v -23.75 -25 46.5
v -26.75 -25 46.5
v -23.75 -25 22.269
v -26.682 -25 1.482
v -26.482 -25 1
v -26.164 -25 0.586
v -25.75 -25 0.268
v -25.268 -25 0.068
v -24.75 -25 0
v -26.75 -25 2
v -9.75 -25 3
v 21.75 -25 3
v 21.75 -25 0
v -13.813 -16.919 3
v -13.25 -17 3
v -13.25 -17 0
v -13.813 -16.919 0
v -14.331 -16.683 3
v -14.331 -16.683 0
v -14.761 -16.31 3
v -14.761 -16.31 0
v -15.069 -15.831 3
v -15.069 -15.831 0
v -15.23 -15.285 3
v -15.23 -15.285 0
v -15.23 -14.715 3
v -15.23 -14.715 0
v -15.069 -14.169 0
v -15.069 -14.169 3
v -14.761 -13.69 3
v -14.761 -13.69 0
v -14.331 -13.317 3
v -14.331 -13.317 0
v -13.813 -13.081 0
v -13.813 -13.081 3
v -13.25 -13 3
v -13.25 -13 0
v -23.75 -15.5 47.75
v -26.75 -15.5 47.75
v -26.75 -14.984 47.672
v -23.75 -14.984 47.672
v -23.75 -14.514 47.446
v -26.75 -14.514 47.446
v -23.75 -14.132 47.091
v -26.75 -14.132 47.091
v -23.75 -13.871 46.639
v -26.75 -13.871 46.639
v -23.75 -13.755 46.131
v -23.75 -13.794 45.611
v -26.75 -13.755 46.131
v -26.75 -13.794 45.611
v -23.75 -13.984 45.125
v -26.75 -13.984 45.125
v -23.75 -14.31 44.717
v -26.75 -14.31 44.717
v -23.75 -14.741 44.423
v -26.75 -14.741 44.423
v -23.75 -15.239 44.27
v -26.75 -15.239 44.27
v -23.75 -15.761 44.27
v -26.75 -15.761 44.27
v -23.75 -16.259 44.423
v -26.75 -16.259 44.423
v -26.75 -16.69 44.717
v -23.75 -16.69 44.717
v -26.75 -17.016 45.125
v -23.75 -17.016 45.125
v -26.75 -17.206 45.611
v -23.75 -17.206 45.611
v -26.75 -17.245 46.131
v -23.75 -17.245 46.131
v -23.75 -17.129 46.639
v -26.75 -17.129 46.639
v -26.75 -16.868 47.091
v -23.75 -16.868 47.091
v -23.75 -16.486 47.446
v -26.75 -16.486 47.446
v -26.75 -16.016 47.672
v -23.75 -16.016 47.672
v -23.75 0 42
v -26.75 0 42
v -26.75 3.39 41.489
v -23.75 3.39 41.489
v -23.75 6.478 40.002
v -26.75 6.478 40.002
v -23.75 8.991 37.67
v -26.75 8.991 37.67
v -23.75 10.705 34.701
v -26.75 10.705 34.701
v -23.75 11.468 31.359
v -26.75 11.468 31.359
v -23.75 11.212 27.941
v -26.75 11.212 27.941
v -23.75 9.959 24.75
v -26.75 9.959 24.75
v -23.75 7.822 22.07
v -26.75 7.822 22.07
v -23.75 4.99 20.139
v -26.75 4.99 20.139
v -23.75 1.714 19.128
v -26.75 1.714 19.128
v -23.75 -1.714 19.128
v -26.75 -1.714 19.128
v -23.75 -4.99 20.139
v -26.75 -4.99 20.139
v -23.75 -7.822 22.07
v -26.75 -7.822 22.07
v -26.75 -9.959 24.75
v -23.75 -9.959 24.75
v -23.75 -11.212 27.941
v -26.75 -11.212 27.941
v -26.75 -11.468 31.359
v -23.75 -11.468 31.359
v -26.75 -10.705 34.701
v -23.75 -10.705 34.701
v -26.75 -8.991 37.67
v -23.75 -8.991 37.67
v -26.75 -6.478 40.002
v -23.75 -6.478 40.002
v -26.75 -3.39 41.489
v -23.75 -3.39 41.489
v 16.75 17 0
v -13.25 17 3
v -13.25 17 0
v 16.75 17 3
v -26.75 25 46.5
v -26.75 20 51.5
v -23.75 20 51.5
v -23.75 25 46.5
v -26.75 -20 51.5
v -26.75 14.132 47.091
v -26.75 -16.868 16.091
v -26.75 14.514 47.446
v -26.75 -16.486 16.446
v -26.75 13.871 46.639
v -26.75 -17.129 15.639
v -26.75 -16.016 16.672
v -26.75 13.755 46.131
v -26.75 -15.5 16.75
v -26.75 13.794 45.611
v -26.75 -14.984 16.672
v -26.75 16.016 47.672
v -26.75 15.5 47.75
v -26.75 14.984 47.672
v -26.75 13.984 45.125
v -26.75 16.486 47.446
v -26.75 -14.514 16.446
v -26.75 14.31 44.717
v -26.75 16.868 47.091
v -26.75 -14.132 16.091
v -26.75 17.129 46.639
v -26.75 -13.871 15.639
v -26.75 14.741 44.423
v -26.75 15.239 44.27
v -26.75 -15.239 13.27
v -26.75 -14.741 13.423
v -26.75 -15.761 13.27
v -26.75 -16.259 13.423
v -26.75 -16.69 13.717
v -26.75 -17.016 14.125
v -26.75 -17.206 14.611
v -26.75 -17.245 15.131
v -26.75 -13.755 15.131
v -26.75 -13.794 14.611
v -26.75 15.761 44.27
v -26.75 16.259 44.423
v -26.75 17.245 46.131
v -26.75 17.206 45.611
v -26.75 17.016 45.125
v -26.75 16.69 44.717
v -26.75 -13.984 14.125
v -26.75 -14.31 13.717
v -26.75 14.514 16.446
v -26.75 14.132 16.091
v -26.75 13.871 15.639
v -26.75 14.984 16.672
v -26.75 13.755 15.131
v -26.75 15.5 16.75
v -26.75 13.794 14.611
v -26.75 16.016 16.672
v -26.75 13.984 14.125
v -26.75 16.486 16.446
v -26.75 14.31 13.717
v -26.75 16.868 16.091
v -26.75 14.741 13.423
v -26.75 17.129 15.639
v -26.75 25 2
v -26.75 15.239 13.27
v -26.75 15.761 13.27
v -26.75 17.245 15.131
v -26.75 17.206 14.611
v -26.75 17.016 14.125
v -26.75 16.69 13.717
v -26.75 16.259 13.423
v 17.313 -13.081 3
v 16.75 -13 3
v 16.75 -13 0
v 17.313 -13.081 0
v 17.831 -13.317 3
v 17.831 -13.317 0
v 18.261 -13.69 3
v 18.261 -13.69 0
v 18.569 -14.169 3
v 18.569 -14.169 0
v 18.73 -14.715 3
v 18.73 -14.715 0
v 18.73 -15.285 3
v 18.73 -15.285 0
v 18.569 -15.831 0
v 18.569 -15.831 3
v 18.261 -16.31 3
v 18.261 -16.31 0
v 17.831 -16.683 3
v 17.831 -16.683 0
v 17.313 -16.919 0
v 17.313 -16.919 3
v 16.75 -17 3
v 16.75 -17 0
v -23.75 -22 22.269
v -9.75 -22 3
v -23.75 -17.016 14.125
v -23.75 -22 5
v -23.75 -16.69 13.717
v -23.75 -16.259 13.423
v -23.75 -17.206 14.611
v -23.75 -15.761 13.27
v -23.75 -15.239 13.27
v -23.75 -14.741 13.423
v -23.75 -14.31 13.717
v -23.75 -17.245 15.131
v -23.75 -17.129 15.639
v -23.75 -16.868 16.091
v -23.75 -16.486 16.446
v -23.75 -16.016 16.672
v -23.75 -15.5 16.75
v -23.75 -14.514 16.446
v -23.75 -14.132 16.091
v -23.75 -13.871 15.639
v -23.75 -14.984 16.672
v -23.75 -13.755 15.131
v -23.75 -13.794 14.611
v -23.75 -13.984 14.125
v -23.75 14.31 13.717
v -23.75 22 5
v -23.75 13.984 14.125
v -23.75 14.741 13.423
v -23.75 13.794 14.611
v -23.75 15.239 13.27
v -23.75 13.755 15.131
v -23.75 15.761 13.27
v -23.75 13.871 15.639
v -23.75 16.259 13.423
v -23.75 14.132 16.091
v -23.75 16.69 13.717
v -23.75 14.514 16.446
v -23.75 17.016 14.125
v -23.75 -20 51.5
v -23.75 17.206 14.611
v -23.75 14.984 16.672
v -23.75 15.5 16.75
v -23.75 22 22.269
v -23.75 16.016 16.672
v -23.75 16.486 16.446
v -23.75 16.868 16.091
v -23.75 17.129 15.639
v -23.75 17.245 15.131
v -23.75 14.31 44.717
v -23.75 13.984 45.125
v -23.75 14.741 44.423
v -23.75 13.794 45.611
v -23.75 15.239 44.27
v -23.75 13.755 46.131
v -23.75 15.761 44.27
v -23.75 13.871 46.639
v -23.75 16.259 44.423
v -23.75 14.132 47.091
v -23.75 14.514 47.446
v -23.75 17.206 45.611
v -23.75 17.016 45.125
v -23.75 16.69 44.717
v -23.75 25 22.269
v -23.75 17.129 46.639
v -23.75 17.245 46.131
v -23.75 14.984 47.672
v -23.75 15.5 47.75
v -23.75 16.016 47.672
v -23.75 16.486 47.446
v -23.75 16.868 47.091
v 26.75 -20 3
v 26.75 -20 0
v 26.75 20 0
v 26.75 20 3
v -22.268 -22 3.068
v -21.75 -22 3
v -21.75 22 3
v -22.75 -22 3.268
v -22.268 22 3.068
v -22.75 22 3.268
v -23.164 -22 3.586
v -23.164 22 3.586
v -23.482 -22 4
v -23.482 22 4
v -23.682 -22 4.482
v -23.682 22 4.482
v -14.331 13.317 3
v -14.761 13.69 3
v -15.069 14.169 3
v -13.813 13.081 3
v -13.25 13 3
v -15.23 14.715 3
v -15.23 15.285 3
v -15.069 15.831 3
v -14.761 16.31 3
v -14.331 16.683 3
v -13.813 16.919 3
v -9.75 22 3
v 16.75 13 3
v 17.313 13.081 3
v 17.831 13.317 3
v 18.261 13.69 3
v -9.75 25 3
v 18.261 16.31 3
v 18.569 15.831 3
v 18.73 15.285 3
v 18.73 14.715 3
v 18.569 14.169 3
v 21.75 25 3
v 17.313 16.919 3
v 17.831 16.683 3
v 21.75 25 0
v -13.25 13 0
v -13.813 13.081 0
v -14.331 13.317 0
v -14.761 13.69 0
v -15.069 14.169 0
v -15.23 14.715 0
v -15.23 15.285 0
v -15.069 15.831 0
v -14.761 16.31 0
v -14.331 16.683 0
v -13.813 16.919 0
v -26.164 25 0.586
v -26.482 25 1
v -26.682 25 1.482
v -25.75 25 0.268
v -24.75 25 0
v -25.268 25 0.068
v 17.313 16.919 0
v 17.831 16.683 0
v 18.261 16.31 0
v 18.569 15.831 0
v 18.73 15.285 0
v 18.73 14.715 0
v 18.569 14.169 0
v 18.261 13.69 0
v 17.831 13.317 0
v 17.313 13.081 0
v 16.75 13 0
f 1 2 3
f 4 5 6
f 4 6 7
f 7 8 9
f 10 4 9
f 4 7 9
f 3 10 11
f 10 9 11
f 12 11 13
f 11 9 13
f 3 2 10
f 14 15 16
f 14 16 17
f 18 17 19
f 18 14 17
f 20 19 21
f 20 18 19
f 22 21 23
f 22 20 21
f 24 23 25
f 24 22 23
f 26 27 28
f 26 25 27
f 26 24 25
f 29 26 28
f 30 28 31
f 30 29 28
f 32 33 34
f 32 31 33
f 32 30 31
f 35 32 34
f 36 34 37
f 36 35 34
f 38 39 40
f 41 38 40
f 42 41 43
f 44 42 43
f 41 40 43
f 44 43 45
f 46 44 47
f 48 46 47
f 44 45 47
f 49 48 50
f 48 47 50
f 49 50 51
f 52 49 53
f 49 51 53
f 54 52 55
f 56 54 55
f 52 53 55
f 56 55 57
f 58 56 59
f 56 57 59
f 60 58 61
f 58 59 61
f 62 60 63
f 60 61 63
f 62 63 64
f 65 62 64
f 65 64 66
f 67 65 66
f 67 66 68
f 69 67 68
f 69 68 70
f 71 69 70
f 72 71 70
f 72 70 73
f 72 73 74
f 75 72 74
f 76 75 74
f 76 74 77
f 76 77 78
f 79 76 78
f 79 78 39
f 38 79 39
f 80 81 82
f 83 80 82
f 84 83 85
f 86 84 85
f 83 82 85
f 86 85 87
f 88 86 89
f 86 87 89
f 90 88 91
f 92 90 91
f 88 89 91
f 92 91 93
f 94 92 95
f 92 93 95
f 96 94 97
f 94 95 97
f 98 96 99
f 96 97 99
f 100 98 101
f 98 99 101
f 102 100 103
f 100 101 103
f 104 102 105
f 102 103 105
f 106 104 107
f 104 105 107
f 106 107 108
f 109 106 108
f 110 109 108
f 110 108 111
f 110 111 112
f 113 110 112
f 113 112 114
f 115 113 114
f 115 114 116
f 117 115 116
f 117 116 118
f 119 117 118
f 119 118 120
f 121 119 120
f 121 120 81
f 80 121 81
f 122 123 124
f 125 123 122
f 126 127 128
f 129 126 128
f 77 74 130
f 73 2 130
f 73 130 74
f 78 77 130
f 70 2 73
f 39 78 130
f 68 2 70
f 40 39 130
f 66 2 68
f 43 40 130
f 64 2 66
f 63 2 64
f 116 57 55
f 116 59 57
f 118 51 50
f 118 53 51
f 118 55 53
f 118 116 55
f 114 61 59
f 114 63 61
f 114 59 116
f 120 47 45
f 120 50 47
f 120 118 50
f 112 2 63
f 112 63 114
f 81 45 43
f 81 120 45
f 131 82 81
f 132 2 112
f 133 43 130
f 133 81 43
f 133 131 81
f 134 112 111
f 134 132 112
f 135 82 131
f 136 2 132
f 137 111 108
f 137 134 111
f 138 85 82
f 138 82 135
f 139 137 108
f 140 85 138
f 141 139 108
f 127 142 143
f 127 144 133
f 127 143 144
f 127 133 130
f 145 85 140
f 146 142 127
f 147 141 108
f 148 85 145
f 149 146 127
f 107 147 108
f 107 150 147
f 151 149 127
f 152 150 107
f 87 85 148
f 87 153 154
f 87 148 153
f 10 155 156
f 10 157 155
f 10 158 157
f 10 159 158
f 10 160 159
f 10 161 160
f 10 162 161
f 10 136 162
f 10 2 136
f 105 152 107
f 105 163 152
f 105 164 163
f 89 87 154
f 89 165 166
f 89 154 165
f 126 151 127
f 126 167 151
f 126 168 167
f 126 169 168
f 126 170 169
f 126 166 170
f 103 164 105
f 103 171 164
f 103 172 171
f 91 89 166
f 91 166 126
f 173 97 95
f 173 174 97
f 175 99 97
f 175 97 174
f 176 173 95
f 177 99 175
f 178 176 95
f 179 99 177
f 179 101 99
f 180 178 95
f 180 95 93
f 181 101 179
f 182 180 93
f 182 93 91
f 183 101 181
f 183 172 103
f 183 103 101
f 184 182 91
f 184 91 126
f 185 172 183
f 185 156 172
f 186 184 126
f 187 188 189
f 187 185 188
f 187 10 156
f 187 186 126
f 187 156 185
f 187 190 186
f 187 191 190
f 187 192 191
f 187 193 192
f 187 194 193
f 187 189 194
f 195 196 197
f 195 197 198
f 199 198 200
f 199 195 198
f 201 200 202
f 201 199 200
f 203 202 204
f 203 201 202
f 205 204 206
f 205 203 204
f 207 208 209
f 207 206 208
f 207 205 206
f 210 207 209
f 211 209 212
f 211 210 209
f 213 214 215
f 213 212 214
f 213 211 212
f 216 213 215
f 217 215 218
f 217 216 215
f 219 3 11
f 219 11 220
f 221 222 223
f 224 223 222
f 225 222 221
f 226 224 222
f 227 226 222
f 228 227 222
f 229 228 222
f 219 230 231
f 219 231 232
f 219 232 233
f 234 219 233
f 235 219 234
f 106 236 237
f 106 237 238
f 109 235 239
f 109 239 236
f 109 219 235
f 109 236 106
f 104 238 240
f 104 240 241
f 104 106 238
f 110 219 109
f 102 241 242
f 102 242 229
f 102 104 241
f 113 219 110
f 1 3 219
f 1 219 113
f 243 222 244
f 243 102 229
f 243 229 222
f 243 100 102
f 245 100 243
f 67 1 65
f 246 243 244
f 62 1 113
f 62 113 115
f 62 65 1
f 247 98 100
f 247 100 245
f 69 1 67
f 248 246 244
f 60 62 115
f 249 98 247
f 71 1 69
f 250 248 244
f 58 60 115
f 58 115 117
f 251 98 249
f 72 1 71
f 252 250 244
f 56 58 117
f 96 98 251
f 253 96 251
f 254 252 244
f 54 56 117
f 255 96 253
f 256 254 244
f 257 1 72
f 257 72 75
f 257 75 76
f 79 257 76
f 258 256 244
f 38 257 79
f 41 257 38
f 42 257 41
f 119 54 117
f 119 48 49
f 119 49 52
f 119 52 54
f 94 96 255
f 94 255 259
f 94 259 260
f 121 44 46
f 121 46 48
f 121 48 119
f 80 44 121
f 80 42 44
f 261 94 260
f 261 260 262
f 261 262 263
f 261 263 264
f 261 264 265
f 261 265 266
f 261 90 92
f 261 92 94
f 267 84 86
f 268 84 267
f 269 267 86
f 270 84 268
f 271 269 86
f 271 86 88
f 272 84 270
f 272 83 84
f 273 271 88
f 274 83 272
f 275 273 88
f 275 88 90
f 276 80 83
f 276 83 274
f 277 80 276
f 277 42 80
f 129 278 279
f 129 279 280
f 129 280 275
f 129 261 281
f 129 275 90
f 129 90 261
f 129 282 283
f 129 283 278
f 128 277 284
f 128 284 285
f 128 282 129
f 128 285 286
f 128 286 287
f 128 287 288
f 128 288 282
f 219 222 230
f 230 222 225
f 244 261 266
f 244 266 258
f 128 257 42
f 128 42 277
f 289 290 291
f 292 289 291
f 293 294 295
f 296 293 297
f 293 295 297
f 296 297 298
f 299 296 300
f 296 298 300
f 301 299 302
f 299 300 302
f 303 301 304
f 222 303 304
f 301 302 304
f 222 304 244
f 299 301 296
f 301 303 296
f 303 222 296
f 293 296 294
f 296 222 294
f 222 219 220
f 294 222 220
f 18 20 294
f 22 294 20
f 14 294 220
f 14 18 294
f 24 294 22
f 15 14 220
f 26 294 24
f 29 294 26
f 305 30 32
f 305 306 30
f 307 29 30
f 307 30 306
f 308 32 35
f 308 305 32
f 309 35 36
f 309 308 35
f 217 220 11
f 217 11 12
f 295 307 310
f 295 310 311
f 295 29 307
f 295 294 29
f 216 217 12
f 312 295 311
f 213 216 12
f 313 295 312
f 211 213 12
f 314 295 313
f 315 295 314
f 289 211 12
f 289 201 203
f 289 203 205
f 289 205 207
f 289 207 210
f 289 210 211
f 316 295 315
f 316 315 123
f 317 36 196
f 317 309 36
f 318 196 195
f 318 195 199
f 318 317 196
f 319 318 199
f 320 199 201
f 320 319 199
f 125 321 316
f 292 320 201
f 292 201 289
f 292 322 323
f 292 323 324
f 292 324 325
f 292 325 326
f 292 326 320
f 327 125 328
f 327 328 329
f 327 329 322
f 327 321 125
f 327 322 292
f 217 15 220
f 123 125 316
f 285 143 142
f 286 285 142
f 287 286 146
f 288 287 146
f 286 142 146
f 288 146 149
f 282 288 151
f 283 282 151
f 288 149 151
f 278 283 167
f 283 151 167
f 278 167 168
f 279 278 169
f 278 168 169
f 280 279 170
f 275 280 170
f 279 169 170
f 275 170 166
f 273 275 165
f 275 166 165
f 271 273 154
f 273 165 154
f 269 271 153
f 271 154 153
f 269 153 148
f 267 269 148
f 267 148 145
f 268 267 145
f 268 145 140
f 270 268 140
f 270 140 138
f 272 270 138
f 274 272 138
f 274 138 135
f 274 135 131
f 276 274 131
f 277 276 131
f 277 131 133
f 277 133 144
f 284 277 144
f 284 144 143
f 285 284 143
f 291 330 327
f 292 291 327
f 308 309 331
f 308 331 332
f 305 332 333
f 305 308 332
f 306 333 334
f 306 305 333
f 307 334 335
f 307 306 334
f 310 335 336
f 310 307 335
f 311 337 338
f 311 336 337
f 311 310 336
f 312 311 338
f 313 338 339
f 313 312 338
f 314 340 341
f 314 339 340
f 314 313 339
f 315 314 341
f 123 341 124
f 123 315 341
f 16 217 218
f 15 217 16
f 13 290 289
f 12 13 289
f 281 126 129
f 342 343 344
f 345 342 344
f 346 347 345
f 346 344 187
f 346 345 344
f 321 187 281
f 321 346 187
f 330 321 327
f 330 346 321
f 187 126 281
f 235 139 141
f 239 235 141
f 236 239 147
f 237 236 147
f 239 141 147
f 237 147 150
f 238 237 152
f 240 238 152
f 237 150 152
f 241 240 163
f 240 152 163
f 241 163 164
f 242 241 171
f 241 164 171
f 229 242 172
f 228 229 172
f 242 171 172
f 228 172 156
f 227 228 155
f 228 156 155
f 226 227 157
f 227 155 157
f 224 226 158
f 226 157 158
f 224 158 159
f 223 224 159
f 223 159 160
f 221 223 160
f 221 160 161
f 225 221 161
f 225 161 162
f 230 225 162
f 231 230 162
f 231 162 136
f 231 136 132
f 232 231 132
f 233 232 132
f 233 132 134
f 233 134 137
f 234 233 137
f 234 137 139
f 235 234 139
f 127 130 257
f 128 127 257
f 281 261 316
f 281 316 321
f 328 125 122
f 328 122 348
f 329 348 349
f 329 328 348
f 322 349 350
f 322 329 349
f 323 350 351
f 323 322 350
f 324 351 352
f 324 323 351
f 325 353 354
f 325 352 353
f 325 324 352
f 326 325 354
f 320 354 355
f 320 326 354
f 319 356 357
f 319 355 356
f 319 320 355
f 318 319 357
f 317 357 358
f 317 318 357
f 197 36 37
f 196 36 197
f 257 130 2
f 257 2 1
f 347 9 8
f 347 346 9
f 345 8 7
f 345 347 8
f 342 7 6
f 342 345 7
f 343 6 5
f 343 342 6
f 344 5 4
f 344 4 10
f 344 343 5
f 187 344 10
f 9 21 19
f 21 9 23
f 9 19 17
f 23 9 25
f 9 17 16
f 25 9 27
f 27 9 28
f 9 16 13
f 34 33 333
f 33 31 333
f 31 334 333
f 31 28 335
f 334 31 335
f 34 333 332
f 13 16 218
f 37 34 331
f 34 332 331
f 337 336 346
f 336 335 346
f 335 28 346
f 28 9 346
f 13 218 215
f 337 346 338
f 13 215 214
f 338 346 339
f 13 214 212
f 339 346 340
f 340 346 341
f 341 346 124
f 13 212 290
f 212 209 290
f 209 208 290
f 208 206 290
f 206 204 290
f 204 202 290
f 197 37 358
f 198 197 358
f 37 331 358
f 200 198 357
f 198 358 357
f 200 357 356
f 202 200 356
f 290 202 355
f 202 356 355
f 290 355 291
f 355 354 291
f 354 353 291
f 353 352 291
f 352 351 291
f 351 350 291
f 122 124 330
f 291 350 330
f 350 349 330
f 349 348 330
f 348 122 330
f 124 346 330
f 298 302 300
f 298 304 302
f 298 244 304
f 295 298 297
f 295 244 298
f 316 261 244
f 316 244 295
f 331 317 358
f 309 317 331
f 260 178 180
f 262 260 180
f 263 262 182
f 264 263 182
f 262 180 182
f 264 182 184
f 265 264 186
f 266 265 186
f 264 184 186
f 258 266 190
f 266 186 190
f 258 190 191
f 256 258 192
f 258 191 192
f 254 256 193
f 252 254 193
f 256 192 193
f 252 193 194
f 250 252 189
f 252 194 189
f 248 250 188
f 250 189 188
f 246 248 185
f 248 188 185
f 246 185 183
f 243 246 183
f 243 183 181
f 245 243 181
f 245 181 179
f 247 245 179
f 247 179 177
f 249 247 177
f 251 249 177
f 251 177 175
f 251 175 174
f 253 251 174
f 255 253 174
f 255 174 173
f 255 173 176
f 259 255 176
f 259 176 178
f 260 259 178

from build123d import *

# Parameters (mm, degrees)
SKETCH2_W           = 53.5
SKETCH2_H           = 50
BOSS_EXTRUDE1_DEPTH = 51.5
SKETCH3_W           = 50.5
SKETCH3_H           = 50
CUT_EXTRUDE1_DEPTH  = 48.5
CHAMFER1_SIZE       = 14
CHAMFER1_SIZE2      = 19.269346887
SKETCH4_W           = 48.5
SKETCH4_H           = 44
CUT_EXTRUDE2_DEPTH  = 50.5
SKETCH5_R           = 1.75
SKETCH5_R_2         = 11.5
CUT_EXTRUDE3_DEPTH  = 10
CUT_EXTRUDE4_DEPTH  = 10
CHAMFER2_SIZE       = 5
FILLET1_R           = 2


with BuildPart() as part:
    # Sketch2 → Boss-Extrude1 (new body)
    with BuildSketch(Plane.XY):
        Rectangle(SKETCH2_W, SKETCH2_H)
    extrude(amount=BOSS_EXTRUDE1_DEPTH)

    # Sketch3 → Cut-Extrude1 (cut)
    with BuildSketch(Plane.XY.offset(51.5)):
        with Locations((1.5, 0)):
            Rectangle(SKETCH3_W, SKETCH3_H)
    extrude(amount=-CUT_EXTRUDE1_DEPTH, mode=Mode.SUBTRACT)

    # Chamfer1
    chamfer1_edges = [part.edges().sort_by_distance(p)[0] for p in [
        (-23.75, 0, 3),
    ]]
    chamfer1_side = [part.faces().sort_by_distance(p)[0] for p in [
        (1.5, 0, 3),
    ]]
    chamfer(chamfer1_edges, length=CHAMFER1_SIZE, length2=CHAMFER1_SIZE2, reference=chamfer1_side[0])

    # Sketch4 → Cut-Extrude2 (cut)
    with BuildSketch(Plane(origin=(26.75, 0, 0), x_dir=(0, 0, -1), z_dir=(1, 0, 0))):
        with Locations((-27.25, 0)):
            Rectangle(SKETCH4_W, SKETCH4_H)
    extrude(amount=-CUT_EXTRUDE2_DEPTH, mode=Mode.SUBTRACT)

    # Sketch5 → Cut-Extrude3 (cut)
    with BuildSketch(Plane.ZY.offset(26.75)):
        with Locations((46, 15.5)):
            Circle(SKETCH5_R)
        with Locations((46, -15.5)):
            Circle(SKETCH5_R)
        with Locations((15, 15.5)):
            Circle(SKETCH5_R)
        with Locations((15, -15.5)):
            Circle(SKETCH5_R)
        with Locations((30.5, 0)):
            Circle(SKETCH5_R_2)
    extrude(amount=-CUT_EXTRUDE3_DEPTH, mode=Mode.SUBTRACT)

    # Sketch6 → Cut-Extrude4 (cut)
    with BuildSketch(Plane.XY.offset(3)):
        with BuildLine():
            Line((-13.25, 17), (16.75, 17))
            ThreePointArc((16.75, 17), (18.75, 15), (16.75, 13))
            Line((16.75, 13), (-13.25, 13))
            ThreePointArc((-13.25, 13), (-15.25, 15), (-13.25, 17))
        make_face()
        with BuildLine():
            Line((-13.25, -13), (16.75, -13))
            ThreePointArc((16.75, -13), (18.75, -15), (16.75, -17))
            Line((16.75, -17), (-13.25, -17))
            ThreePointArc((-13.25, -17), (-15.25, -15), (-13.25, -13))
        make_face()
    extrude(amount=-CUT_EXTRUDE4_DEPTH, mode=Mode.SUBTRACT)

    # Chamfer2
    chamfer2_edges = [part.edges().sort_by_distance(p)[0] for p in [
        (-25.25, -25, 51.5),
        (-25.25, 25, 51.5),
        (26.75, -25, 1.5),
        (26.75, 25, 1.5),
    ]]
    chamfer(chamfer2_edges, length=CHAMFER2_SIZE)

    # Fillet1
    fillet1_edges = [part.edges().sort_by_distance(p)[0] for p in [
        (-23.75, 0, 3),
        (-26.75, 0, 0),
    ]]
    fillet(fillet1_edges, radius=FILLET1_R)


solid = part.part
